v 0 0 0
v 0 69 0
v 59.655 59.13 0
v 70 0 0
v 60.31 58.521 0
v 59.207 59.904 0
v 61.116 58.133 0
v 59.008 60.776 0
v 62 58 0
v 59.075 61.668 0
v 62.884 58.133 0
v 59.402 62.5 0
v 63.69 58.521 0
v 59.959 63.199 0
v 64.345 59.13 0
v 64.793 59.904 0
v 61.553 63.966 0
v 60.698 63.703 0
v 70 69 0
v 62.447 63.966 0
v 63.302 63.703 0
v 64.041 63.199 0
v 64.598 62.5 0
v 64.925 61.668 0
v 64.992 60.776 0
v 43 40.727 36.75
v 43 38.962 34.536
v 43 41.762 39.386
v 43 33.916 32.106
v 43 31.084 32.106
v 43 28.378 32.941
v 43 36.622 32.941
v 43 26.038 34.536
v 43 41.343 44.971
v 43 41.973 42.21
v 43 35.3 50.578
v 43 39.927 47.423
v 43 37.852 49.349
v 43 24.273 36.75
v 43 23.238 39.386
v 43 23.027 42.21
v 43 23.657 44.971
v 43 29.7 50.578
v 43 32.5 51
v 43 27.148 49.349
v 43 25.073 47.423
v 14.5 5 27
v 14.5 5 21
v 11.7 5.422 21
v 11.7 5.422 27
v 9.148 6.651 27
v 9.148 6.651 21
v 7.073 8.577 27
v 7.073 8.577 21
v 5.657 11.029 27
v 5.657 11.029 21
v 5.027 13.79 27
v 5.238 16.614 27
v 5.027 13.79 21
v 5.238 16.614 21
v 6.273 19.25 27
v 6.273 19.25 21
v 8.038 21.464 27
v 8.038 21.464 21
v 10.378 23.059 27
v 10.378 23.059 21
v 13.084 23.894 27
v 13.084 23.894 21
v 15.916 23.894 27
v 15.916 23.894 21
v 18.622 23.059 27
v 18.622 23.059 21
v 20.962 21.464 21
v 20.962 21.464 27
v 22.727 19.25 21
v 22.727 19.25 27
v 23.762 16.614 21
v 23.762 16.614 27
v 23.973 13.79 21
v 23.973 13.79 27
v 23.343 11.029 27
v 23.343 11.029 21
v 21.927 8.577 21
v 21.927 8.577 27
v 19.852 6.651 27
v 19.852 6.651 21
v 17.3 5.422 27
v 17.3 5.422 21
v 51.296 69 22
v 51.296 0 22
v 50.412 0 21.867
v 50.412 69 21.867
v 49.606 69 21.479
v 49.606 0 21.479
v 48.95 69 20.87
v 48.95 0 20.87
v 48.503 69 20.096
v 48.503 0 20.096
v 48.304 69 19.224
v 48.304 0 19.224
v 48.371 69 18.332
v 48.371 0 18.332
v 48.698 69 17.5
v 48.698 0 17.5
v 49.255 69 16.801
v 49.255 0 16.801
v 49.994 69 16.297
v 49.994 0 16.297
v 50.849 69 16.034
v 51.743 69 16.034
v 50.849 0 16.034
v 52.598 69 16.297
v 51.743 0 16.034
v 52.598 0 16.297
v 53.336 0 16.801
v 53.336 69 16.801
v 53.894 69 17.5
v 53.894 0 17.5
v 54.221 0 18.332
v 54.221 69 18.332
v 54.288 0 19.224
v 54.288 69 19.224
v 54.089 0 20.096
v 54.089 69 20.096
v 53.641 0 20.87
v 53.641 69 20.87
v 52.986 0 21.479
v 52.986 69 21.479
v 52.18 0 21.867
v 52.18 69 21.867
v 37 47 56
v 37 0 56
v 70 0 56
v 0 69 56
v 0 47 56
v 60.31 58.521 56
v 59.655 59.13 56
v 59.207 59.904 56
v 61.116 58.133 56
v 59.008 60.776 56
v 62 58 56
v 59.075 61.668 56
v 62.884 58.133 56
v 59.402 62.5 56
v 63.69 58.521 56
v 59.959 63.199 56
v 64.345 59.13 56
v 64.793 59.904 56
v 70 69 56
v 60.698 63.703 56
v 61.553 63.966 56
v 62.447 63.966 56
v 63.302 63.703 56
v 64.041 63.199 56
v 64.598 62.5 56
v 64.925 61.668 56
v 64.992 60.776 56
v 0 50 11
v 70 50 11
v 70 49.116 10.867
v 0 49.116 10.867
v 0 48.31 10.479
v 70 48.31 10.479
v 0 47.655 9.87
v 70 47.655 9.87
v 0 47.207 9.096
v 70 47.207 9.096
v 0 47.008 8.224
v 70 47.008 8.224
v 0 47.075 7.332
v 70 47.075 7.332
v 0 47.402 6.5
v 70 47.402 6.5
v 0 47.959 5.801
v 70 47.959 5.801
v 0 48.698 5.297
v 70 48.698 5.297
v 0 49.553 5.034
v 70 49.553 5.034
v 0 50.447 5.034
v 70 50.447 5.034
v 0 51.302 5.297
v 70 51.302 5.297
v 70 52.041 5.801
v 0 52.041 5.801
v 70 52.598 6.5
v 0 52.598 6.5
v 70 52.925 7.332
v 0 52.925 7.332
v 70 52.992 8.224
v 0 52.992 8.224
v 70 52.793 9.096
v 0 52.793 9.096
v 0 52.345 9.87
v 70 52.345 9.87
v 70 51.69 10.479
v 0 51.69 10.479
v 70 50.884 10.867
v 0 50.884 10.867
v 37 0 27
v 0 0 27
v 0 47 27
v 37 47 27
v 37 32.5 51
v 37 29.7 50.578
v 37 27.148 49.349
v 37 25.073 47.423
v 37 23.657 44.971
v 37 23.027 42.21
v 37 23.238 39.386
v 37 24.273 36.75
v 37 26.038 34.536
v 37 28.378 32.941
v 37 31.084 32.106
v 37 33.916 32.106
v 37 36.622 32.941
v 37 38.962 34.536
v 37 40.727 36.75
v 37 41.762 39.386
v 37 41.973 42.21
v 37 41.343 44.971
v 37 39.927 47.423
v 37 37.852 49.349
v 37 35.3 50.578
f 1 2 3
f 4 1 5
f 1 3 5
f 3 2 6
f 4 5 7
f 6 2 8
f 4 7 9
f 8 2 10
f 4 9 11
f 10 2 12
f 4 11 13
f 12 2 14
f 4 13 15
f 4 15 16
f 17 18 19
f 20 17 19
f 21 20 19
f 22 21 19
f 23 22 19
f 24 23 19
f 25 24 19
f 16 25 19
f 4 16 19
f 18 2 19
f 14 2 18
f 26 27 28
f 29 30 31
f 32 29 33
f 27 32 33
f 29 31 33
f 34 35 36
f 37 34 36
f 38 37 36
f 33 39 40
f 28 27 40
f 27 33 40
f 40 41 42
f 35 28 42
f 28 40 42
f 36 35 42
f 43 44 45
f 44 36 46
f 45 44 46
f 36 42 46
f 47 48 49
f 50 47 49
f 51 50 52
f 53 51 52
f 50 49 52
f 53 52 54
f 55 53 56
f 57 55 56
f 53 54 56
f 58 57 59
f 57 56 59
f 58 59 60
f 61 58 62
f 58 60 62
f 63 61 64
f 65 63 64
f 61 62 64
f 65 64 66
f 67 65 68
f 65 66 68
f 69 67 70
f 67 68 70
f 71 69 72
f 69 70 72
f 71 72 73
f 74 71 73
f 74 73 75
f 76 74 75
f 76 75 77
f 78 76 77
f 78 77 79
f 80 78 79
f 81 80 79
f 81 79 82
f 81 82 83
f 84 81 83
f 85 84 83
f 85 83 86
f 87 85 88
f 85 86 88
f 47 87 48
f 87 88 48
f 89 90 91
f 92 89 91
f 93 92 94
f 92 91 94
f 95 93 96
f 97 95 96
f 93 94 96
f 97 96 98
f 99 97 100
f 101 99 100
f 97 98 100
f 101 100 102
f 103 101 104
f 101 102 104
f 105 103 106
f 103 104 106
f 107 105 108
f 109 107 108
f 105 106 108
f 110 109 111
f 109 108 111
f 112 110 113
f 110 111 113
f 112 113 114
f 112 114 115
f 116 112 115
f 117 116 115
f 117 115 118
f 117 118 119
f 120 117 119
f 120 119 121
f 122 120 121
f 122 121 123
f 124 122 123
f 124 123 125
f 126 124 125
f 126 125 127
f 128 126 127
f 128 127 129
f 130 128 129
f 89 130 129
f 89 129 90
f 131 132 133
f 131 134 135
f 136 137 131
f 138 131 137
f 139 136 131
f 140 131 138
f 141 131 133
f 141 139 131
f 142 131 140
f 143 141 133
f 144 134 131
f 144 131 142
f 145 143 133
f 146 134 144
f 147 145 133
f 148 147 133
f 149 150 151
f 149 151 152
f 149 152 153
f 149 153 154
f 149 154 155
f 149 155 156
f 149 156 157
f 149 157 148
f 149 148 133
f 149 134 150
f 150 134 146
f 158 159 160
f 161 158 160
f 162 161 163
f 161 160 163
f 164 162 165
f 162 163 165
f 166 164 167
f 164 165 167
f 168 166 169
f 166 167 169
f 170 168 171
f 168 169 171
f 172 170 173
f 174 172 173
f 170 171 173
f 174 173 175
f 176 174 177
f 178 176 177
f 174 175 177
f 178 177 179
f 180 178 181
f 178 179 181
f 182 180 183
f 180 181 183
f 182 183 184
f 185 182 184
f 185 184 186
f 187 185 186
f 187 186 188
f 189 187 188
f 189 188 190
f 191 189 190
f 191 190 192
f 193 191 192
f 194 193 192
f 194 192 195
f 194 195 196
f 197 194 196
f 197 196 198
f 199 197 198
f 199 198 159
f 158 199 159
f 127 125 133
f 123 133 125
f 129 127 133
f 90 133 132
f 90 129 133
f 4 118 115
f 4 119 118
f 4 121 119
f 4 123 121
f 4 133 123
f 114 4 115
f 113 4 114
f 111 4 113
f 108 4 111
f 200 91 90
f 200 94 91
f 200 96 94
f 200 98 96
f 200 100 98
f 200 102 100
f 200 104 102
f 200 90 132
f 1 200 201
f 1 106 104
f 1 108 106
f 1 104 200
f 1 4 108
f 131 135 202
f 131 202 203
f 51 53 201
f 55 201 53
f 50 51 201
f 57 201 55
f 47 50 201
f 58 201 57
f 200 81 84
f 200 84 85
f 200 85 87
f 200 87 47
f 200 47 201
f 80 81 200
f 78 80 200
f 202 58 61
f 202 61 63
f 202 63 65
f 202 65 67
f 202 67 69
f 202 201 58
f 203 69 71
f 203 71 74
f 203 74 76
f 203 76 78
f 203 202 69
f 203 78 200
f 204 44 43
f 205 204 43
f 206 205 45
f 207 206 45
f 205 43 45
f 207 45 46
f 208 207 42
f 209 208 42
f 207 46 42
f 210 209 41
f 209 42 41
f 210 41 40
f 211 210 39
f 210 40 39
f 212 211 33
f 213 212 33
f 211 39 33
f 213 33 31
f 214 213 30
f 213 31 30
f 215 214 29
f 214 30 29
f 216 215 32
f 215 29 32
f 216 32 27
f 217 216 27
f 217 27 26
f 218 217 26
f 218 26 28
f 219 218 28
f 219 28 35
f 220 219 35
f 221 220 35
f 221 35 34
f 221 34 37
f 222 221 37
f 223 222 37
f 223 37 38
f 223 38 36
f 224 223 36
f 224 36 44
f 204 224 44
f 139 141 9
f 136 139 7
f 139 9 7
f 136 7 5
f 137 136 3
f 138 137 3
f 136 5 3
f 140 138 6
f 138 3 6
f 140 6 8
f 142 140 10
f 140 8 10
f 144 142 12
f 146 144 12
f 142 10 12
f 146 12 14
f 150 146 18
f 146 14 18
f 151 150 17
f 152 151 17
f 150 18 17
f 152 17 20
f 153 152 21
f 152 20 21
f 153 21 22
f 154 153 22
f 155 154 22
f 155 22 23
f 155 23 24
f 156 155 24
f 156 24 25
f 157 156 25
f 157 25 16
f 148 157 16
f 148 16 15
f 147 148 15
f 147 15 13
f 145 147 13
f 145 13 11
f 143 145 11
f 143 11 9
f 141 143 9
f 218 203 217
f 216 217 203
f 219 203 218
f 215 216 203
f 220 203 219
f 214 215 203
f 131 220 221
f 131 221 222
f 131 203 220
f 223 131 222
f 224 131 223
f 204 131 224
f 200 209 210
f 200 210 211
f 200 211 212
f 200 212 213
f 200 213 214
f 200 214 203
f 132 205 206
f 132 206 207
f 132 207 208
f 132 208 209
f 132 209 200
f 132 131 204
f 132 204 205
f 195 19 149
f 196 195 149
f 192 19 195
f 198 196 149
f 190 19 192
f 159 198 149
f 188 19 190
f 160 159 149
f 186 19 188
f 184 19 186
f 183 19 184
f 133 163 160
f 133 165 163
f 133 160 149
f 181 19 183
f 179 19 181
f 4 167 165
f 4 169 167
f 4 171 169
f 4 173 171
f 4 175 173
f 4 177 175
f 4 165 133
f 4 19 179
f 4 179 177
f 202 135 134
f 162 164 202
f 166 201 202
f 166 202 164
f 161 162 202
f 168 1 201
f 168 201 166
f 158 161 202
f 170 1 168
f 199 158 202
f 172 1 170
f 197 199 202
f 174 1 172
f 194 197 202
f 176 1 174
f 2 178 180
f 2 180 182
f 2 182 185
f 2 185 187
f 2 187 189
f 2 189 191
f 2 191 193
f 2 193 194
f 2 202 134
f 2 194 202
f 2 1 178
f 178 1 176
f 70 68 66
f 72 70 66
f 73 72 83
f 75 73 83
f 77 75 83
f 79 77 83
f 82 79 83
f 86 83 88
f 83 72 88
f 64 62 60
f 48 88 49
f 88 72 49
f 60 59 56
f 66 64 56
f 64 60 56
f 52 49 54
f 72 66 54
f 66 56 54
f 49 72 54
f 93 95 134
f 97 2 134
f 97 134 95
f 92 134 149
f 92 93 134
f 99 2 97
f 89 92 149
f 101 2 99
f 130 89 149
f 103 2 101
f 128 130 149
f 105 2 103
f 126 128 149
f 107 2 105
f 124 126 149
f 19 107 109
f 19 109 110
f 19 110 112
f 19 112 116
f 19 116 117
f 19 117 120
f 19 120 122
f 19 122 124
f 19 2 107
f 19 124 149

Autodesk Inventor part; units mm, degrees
ref_plane "YZ Plane" through (0, 0, 0) normal (1, 0, 0) x (0, 1, 0)
ref_plane "XZ Plane" through (0, 0, 0) normal (0, 1, 0) x (-1, 0, 0)
ref_plane "XY Plane" through (0, 0, 0) normal (0, 0, 1) x (1, 0, 0)
sketch "Sketch1" plane through (0, 0, 0) normal (0, 0, 1) x (1, 0, 0)
  line L0 (0, 0) -> (0, 69)
  line L1 (0, 69) -> (70, 69)
  line L2 (70, 69) -> (70, 0)
  line L3 (70, 0) -> (0, 0)
  dimension "d0" = 69
  dimension "d1" = 70
extrude "Extrusion1" add sketch "Sketch1" along normal blind 56
sketch "Sketch2" plane through (0, 0, 56) normal (0, 0, 1) x (1, 0, 0)
  line L0 (0, 0) -> (37, 0)
  line L1 (37, 0) -> (37, 47)
  line L2 (37, 47) -> (0, 47)
  line L3 (0, 47) -> (0, 0)
  dimension "d4" = 37
  dimension "d5" = 47
emboss "Emboss1" sketch "Sketch2" operation cut depth 29 direction (0, 0, -1)
sketch "Sketch3" plane through (0, 0, 56) normal (0, 0, 1) x (1, 0, 0)
  circle A0 centre (62, 61) radius 3
  point P0 (0, 0)
  point P1 (70, 69)
  dimension "d10" = 6
hole "Hole1" at (62, 61, 56) direction (0, 0, -1) diameter 6 end through all
sketch "Sketch4" plane through (0, 0, 0) normal (-1, 0, 0) x (0, 0, 1)
  circle A0 centre (8, 50) radius 3
  point P0 (0, 69)
  dimension "d20" = 6
hole "Hole2" at (0, 50, 8) direction (1, 0, 0) diameter 6 end through all
sketch "Sketch5" plane through (0, 69, 0) normal (0, 1, 0) x (1, 0, 0)
  circle A0 centre (51.2959, -19) radius 3
  dimension "d30" = 6
hole "Hole3" at (51.2959, 69, 19) direction (0, -1, 0) diameter 6 end through all
sketch "Sketch6" plane through (0, 47, 27) normal (0, 0, 1) x (1, 0, 0)
  circle A0 centre (14.5, -32.5) radius 9.5
  dimension "d40" = 19
hole "Hole4" at (14.5, 14.5, 27) direction (0, 0, -1) diameter 19 depth 6
sketch "Sketch7" plane through (37, 0, 56) normal (-1, 0, 0) x (0, 0, 1)
  circle A0 centre (-14.5, 32.5) radius 9.5
  point P0 (-56, 0)
  point P1 (-29, 47)
  dimension "d50" = 19
hole "Hole5" at (37, 32.5, 41.5) direction (1, 0, 0) diameter 19 depth 6
properties part number "Tophjørne1" material "PC/ABS Plastic"
